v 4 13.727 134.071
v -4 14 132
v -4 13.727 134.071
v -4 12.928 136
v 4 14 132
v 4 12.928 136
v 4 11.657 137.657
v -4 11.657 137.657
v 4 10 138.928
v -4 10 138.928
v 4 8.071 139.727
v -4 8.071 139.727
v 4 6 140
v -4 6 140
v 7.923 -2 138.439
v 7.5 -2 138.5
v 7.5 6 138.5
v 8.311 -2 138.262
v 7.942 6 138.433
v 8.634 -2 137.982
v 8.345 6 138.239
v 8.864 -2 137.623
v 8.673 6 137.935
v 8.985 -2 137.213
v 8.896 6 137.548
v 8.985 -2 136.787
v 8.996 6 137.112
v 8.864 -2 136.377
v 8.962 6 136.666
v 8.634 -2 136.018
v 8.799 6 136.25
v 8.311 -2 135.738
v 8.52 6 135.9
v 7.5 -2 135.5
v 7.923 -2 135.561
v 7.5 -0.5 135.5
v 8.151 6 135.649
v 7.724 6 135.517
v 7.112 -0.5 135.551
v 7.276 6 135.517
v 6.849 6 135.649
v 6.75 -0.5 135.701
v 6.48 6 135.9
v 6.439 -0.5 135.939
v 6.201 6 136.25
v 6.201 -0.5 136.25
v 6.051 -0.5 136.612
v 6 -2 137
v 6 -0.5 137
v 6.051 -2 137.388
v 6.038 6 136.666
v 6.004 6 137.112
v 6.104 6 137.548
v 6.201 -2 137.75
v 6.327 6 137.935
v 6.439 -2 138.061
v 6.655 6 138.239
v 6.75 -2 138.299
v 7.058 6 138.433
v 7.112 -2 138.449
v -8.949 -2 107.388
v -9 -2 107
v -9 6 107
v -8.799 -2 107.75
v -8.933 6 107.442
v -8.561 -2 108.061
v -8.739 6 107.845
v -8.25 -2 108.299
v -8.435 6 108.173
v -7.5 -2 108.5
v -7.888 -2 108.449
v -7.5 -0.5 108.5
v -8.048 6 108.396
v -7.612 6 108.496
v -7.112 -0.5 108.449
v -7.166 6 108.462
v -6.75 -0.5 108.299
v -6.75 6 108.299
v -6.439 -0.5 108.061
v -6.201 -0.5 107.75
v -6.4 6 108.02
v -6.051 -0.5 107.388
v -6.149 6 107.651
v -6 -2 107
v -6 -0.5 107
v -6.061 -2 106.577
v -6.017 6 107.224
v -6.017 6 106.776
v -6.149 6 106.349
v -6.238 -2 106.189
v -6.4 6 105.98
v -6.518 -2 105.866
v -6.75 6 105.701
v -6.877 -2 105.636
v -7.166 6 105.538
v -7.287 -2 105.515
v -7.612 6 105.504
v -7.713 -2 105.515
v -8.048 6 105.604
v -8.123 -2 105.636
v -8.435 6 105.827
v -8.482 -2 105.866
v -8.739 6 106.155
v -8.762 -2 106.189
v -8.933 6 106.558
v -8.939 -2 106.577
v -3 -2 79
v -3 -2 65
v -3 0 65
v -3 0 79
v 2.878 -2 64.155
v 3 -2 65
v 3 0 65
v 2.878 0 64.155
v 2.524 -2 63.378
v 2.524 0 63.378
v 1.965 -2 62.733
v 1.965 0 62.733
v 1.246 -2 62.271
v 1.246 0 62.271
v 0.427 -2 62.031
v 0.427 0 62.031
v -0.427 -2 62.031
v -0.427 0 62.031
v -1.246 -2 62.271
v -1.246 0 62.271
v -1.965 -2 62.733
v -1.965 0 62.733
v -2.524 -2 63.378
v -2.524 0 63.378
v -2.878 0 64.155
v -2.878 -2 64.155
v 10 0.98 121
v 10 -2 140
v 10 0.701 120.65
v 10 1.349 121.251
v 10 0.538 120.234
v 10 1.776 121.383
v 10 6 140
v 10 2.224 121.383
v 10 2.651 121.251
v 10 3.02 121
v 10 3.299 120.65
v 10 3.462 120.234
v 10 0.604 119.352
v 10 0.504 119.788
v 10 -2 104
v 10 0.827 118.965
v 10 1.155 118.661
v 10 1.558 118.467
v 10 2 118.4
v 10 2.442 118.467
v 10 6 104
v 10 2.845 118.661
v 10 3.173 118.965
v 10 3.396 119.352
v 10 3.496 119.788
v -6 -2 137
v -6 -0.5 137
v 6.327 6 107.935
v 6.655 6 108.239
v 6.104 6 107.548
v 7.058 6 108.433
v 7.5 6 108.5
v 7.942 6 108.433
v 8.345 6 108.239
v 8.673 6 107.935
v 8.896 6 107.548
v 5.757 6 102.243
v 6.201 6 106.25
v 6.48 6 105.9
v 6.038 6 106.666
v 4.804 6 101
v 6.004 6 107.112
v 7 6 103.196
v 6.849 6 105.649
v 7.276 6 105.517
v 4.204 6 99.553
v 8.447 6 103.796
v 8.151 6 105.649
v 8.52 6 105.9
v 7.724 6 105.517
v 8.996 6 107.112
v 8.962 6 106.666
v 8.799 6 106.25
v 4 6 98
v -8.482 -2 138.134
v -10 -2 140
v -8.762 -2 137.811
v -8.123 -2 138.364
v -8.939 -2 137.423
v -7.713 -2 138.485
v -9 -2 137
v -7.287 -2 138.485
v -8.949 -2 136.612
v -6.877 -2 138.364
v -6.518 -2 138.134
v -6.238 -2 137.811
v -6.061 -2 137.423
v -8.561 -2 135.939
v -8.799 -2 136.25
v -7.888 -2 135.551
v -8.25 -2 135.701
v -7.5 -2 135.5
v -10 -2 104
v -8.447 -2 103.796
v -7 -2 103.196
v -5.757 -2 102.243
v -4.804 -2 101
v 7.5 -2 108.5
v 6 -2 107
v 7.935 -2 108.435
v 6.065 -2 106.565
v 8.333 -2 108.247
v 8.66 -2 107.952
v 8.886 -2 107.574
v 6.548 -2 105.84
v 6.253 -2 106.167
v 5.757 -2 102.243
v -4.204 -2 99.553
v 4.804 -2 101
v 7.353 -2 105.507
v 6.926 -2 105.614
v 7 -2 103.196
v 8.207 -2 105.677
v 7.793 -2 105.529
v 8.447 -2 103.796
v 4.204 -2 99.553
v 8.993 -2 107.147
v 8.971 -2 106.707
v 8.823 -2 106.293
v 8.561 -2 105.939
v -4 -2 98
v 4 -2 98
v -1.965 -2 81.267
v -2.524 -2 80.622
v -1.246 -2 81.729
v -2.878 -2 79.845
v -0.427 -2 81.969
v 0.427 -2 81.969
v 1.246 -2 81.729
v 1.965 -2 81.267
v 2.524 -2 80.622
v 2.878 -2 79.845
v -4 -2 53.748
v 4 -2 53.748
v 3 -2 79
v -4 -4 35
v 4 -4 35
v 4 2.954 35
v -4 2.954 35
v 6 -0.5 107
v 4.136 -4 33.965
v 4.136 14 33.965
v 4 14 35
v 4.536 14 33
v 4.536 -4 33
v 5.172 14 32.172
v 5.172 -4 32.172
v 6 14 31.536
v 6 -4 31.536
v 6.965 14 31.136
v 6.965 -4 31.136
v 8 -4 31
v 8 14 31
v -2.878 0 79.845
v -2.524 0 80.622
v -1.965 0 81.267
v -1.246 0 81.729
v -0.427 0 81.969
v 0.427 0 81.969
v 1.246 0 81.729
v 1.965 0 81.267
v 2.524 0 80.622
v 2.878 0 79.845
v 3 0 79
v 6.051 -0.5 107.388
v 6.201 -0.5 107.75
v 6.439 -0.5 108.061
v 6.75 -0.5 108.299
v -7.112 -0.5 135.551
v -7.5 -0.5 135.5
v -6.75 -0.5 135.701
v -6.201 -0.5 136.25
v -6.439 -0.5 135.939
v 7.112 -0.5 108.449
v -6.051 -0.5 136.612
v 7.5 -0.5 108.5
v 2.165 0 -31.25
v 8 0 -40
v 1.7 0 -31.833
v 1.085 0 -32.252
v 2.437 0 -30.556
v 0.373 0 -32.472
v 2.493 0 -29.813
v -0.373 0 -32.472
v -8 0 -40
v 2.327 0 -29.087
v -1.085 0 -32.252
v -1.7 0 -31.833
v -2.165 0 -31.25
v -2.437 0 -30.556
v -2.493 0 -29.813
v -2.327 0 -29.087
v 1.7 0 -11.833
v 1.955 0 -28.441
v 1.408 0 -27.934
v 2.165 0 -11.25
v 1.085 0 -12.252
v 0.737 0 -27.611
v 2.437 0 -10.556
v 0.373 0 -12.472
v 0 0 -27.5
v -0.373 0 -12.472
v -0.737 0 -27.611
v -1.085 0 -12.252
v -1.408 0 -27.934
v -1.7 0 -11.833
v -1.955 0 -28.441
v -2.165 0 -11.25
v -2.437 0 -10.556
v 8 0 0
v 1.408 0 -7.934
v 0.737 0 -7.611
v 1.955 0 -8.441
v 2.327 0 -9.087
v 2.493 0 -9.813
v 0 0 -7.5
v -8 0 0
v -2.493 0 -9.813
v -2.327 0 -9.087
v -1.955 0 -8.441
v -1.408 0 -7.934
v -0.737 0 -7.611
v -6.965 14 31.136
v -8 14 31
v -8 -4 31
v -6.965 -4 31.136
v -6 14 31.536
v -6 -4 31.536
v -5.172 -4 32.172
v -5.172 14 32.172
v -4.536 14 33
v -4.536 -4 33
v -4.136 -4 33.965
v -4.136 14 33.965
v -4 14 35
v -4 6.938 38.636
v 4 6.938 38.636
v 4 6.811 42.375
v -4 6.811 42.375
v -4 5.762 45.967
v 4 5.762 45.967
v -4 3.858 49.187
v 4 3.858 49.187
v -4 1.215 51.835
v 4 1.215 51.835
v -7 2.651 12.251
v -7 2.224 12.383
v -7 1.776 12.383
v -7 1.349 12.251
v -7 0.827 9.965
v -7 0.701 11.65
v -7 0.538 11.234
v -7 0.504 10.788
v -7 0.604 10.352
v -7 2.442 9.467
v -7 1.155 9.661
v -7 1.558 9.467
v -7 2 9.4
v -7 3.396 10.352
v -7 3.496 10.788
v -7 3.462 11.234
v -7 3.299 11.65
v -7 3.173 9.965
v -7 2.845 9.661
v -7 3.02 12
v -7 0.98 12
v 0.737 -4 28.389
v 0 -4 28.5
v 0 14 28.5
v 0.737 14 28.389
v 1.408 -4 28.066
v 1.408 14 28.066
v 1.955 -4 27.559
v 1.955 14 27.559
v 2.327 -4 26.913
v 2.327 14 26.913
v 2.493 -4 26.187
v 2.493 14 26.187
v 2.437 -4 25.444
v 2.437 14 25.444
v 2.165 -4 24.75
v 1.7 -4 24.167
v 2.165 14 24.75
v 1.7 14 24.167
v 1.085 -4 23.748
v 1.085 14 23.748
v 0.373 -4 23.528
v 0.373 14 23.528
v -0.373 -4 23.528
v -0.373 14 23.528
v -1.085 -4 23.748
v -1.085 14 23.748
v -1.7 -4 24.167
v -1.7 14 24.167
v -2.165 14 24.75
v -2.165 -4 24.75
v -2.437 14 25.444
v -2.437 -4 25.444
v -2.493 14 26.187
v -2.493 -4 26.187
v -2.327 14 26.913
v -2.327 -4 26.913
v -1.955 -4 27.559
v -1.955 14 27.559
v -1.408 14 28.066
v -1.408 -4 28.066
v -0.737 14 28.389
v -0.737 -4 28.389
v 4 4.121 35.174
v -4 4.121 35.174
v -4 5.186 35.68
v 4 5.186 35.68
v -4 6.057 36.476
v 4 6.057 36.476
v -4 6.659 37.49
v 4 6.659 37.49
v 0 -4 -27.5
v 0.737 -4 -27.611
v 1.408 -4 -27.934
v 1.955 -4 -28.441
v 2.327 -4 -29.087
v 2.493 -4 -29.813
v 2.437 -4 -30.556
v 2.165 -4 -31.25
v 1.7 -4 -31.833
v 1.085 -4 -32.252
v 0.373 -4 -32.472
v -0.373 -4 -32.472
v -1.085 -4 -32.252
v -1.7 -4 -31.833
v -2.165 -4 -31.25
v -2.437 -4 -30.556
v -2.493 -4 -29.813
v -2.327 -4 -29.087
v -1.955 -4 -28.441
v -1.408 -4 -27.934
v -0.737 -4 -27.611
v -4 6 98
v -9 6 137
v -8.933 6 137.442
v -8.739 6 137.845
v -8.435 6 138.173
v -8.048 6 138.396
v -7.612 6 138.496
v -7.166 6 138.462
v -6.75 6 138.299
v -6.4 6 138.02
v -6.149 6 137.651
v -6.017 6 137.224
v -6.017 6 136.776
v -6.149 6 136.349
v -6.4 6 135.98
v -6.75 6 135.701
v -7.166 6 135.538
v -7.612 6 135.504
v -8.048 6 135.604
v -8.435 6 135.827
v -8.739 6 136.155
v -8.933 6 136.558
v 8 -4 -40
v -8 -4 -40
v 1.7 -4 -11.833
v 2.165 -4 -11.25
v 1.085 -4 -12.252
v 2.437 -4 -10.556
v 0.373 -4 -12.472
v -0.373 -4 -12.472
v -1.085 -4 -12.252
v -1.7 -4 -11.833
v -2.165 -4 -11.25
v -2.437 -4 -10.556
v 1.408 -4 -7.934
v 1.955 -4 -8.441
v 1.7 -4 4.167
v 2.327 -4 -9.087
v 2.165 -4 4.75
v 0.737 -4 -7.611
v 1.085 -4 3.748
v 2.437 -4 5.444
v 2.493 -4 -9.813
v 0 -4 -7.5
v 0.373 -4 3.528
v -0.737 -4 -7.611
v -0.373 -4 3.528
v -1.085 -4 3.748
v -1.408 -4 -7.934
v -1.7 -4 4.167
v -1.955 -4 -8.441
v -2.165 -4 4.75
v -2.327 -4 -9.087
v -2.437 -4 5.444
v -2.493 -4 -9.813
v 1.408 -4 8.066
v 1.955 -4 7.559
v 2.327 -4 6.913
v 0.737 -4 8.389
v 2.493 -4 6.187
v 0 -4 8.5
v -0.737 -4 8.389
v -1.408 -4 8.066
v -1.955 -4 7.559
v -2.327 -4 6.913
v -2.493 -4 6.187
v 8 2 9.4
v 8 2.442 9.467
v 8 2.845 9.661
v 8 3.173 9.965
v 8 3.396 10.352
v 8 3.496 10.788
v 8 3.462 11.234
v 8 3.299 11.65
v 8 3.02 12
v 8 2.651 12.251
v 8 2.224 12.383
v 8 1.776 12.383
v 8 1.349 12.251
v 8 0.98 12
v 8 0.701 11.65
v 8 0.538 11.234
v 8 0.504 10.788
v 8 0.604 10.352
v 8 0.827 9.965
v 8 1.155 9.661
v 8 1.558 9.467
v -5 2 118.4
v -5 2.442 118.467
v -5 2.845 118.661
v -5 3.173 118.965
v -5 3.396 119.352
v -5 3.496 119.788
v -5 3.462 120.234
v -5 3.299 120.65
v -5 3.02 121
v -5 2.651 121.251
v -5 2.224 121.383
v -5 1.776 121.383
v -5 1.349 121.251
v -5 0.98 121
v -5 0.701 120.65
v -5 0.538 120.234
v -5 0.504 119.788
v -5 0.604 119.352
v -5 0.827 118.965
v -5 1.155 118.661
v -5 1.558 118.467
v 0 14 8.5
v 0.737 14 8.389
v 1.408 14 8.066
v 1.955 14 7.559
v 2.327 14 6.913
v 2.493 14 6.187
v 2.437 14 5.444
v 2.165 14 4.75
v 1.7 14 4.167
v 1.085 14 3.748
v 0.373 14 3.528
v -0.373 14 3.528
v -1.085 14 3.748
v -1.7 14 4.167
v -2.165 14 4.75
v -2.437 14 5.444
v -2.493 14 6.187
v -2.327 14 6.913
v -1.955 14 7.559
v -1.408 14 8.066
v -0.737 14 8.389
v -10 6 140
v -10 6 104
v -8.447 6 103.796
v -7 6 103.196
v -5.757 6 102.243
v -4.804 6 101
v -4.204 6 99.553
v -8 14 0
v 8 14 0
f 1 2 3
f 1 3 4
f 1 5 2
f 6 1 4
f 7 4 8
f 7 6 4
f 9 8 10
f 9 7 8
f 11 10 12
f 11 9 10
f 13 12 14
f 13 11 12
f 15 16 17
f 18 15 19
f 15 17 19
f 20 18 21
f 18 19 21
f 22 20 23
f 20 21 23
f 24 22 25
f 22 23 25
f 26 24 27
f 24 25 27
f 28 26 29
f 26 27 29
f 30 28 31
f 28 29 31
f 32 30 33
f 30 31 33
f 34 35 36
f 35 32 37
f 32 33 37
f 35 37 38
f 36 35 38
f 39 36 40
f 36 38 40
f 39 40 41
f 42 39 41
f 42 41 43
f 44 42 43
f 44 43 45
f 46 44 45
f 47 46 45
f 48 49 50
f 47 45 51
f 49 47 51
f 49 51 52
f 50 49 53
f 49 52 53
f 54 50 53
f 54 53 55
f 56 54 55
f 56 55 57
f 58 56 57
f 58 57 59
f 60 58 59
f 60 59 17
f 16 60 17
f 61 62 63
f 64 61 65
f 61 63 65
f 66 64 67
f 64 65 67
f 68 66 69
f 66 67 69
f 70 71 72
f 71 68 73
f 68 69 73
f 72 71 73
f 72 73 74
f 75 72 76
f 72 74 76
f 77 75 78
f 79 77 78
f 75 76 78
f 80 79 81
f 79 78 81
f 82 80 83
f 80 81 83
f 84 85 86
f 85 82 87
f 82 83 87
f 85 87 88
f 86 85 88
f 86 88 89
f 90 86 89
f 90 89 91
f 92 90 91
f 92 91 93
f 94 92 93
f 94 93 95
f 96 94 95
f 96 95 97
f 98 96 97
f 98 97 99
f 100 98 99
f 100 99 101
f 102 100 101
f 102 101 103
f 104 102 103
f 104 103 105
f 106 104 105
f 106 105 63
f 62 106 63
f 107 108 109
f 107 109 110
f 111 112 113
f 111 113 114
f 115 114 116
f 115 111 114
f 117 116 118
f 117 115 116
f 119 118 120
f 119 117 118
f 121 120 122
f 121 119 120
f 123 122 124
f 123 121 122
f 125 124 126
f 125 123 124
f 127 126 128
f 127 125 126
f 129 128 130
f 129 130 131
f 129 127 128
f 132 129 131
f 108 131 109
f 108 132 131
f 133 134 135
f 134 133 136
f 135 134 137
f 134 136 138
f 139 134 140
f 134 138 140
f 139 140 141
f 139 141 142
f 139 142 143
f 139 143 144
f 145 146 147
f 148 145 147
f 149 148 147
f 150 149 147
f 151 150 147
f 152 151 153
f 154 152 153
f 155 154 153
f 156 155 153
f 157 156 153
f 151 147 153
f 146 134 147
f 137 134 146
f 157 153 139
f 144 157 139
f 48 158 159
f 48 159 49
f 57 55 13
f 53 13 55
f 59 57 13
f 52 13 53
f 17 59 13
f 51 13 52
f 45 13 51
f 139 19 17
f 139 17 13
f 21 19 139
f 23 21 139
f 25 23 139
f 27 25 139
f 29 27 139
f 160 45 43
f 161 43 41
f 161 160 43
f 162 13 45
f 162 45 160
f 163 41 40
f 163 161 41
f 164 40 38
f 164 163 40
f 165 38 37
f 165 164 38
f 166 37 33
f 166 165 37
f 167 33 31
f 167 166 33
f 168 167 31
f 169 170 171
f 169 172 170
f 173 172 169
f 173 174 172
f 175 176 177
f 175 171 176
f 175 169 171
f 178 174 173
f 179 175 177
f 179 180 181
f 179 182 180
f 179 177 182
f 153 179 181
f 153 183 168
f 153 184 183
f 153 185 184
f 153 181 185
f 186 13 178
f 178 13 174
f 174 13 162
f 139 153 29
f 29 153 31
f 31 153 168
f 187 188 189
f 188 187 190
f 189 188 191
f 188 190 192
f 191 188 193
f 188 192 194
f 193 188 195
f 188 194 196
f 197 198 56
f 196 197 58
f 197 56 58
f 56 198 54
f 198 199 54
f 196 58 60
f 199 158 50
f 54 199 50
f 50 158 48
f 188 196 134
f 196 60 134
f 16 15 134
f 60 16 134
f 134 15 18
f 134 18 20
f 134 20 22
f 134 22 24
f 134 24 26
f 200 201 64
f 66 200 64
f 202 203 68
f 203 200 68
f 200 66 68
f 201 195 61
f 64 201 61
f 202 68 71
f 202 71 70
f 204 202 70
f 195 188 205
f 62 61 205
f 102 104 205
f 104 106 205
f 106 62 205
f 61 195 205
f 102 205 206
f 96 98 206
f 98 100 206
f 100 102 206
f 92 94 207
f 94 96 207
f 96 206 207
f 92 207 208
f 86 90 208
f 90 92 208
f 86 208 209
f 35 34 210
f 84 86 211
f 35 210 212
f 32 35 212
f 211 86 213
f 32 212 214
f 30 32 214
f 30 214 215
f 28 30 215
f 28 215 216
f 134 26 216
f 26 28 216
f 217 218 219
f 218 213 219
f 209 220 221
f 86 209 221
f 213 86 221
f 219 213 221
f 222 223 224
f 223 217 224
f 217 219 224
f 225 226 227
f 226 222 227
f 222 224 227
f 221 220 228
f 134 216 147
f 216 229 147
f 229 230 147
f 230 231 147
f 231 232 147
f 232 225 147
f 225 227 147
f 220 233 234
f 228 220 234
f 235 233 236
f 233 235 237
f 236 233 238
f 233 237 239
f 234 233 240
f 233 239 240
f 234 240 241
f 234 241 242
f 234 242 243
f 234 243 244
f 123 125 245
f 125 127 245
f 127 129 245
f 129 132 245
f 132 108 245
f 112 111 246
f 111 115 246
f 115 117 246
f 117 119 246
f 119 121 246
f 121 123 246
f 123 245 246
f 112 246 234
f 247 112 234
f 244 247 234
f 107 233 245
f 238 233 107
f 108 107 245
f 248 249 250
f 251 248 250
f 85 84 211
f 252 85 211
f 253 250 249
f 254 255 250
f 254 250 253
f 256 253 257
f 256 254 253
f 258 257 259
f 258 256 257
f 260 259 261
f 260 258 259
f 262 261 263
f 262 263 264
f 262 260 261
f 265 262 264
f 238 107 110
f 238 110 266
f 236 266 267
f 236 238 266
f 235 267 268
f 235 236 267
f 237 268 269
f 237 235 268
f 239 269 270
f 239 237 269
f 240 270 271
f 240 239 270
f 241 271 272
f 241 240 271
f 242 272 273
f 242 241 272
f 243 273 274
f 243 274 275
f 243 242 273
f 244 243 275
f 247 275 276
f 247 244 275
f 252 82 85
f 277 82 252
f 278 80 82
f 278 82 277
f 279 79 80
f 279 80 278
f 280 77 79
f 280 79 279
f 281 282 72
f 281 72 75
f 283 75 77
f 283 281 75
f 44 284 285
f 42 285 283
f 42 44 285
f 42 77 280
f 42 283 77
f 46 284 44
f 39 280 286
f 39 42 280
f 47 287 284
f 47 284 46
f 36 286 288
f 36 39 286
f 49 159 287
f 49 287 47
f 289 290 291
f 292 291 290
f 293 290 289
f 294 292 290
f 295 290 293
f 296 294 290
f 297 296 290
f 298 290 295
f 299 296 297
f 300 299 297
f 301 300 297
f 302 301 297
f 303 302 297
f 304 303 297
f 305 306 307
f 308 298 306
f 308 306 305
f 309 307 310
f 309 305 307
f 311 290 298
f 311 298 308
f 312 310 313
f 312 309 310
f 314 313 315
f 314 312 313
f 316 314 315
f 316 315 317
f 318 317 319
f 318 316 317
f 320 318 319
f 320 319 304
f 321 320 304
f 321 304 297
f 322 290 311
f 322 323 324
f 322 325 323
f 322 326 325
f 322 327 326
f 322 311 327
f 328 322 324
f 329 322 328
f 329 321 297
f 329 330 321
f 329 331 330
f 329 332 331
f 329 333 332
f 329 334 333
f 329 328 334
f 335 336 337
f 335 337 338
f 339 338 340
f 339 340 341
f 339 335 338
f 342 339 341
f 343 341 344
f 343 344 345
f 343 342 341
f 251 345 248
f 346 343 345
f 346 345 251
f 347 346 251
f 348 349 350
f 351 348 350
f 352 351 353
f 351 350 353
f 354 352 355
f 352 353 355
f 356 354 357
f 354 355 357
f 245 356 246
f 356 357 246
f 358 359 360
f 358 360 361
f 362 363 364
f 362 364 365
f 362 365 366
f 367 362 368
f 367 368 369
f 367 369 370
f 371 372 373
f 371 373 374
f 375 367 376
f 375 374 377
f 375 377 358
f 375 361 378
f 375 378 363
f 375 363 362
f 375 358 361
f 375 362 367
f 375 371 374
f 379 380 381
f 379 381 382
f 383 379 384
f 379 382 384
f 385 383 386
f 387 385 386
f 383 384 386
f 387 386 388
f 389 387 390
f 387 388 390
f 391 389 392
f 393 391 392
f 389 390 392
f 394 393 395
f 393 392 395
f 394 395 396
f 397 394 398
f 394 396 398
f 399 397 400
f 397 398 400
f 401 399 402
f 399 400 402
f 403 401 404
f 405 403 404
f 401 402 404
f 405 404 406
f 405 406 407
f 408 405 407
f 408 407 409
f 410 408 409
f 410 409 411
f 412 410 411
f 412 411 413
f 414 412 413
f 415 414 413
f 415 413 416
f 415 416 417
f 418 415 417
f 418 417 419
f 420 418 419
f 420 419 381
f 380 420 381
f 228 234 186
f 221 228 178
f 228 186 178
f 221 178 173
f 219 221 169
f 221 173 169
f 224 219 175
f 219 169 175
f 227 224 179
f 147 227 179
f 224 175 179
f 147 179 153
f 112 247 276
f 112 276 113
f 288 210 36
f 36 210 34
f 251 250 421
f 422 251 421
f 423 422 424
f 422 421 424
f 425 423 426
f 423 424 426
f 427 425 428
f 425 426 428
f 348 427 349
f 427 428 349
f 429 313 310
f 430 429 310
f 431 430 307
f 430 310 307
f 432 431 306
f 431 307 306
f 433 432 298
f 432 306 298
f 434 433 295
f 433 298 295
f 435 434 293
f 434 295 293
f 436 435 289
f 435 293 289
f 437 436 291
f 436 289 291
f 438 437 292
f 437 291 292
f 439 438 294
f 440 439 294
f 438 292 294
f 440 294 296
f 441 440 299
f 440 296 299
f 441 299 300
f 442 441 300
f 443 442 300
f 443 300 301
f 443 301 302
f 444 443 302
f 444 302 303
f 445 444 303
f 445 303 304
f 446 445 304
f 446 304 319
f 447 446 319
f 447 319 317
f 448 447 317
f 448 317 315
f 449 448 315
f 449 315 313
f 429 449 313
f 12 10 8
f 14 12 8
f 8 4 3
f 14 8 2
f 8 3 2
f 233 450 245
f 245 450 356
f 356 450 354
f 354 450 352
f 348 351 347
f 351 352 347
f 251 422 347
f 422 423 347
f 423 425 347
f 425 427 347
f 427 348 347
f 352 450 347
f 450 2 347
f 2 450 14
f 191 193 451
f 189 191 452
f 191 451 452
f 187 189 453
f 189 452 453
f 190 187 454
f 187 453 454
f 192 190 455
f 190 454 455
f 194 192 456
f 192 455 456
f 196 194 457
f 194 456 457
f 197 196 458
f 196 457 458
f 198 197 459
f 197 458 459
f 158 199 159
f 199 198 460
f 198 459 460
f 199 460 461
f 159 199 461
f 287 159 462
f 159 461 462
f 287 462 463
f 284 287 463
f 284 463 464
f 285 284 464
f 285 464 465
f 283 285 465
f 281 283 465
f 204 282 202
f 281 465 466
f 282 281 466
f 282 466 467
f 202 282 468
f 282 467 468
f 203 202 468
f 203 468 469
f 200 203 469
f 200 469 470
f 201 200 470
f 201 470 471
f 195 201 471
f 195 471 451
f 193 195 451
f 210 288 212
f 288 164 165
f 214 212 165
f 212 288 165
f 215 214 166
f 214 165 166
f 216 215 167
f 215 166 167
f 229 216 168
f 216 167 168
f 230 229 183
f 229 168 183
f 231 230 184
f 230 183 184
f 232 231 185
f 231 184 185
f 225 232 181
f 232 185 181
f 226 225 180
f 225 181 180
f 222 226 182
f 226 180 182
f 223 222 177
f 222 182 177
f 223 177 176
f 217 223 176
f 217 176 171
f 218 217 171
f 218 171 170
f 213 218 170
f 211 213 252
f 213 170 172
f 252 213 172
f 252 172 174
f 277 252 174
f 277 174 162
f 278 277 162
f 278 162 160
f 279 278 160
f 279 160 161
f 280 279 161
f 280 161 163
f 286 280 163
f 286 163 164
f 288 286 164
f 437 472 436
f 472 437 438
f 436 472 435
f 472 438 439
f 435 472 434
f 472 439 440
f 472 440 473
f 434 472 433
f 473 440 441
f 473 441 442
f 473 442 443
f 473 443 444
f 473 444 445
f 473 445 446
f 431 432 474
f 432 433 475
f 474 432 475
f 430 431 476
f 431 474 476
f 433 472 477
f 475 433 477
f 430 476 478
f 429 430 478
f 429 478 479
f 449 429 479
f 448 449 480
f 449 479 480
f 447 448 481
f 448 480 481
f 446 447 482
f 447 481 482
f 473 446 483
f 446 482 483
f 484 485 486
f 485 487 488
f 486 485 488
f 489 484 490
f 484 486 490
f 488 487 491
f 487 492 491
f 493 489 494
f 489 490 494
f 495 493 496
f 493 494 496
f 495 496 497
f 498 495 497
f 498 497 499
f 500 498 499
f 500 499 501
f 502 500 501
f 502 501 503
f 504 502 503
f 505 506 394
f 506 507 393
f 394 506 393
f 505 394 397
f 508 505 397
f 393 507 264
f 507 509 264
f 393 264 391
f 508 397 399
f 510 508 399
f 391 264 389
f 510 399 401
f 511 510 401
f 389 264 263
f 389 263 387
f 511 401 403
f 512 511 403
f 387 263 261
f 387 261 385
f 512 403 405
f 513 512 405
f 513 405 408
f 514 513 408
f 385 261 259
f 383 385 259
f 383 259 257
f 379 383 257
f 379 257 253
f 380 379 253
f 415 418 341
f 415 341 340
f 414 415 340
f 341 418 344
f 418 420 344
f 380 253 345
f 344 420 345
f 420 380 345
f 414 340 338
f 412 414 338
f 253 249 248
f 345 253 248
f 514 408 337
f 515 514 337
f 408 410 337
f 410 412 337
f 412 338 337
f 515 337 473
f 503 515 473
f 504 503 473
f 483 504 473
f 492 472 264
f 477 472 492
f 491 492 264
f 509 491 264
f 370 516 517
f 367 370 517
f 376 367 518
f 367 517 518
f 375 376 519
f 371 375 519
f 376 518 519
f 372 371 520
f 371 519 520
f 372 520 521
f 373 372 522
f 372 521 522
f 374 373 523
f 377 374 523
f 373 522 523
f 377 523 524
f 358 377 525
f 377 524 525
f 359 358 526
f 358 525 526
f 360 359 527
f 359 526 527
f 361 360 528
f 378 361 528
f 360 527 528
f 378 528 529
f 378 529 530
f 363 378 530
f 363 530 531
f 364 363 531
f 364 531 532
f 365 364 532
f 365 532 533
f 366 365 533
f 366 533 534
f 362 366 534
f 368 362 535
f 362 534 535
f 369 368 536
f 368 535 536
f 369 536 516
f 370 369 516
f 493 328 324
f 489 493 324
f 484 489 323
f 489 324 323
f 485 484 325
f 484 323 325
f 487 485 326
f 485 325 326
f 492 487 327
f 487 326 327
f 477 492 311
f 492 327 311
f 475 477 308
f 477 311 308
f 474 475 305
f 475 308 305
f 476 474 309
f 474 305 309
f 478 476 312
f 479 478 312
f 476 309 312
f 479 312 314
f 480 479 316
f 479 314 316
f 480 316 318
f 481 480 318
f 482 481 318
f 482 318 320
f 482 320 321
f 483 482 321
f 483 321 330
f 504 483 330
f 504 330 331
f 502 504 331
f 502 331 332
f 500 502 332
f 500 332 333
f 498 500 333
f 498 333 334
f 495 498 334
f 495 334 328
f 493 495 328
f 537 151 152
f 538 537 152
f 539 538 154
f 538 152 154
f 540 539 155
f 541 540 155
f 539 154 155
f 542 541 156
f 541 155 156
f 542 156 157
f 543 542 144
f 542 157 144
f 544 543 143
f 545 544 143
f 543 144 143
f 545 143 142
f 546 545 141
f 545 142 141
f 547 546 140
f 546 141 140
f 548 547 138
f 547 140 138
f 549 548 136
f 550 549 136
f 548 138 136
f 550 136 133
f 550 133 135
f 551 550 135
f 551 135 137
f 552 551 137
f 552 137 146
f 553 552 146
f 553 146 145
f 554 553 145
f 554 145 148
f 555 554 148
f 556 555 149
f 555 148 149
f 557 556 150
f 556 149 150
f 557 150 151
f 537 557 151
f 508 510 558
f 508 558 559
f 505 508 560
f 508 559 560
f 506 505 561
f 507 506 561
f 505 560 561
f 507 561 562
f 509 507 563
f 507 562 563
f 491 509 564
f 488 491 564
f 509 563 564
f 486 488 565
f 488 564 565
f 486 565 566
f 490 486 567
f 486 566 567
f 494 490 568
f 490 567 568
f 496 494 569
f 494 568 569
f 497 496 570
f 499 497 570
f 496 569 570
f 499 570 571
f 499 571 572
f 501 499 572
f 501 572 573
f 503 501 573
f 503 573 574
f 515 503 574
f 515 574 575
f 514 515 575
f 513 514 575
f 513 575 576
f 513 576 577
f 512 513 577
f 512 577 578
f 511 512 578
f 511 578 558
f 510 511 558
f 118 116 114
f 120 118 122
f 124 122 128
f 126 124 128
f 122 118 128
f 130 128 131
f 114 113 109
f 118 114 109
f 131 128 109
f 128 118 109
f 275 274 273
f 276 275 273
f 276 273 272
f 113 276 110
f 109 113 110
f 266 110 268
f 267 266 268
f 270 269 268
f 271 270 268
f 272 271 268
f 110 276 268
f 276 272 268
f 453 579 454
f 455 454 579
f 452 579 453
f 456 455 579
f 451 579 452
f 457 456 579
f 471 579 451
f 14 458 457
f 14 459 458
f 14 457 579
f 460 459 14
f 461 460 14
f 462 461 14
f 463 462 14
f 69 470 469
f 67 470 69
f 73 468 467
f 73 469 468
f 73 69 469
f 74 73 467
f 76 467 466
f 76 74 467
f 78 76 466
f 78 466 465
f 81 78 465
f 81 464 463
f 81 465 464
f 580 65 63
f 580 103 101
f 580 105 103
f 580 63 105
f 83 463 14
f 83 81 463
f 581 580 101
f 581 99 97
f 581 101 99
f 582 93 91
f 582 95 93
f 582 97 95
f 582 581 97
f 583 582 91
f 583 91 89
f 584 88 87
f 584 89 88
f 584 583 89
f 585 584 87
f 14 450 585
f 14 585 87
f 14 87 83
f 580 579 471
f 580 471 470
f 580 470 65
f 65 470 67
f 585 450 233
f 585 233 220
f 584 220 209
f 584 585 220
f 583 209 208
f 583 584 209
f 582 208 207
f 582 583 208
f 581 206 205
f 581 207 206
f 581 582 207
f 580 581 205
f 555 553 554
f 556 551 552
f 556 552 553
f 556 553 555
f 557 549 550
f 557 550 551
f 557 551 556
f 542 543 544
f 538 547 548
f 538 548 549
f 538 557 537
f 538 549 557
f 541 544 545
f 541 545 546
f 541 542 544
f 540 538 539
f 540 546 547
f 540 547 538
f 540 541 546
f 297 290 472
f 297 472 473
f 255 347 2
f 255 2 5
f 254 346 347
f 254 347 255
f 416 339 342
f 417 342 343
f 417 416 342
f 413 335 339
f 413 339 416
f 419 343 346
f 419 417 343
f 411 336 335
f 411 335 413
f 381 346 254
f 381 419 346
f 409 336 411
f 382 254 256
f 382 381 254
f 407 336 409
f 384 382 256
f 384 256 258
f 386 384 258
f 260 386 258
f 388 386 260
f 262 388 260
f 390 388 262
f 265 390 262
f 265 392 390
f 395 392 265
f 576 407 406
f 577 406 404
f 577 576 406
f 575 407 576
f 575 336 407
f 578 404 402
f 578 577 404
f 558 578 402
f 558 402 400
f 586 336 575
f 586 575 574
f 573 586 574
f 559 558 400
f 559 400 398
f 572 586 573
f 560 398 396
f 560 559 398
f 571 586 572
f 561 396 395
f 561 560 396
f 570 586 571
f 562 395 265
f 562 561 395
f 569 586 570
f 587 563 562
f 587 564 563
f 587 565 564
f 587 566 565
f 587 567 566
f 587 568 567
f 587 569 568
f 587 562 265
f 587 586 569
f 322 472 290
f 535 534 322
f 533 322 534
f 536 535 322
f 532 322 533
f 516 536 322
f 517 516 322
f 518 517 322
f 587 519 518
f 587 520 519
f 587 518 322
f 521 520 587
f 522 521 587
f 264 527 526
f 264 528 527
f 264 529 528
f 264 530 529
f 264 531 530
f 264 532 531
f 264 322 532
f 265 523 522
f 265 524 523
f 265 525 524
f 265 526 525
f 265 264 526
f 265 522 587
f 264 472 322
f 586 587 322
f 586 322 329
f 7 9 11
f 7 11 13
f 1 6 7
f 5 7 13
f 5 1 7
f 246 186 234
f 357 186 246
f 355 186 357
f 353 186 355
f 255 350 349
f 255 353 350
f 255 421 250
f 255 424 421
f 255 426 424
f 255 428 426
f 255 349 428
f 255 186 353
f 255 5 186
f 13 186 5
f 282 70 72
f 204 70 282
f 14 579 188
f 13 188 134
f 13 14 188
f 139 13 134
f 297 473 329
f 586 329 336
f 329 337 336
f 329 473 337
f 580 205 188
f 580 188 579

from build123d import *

# Parameters (mm, degrees)
SKETCH1_W           = 20
SKETCH1_H           = 8
BOSS_EXTRUDE1_DEPTH = 140
CUT_EXTRUDE1_DEPTH  = 141.584494166
BOSS_EXTRUDE2_DEPTH = 4
CUT_EXTRUDE2_DEPTH  = 142.393069137
BOSS_EXTRUDE3_DEPTH = 18
SKETCH7_W           = 16
SKETCH7_H           = 4
BOSS_EXTRUDE4_DEPTH = 40
SKETCH8_R           = 1.5
CUT_EXTRUDE3_DEPTH  = 141.712472795
SKETCH9_W           = 15
SKETCH9_H           = 30
CUT_EXTRUDE4_DEPTH  = 1.5
CUT_EXTRUDE5_DEPTH  = 2
SKETCH11_R          = 2.5
CUT_EXTRUDE6_DEPTH  = 142.50618361
SKETCH12_R          = 2.5
CUT_EXTRUDE7_DEPTH  = 142.05318146
SKETCH13_R          = 1.5
CUT_EXTRUDE8_DEPTH  = 15
SKETCH14_R          = 1.5
CUT_EXTRUDE9_DEPTH  = 15


with BuildPart() as part:
    # Sketch1 → Boss-Extrude1 (new body)
    with BuildSketch(Plane.XY):
        with Locations((0, 2)):
            Rectangle(SKETCH1_W, SKETCH1_H)
    extrude(amount=BOSS_EXTRUDE1_DEPTH)

    # Sketch2 → Cut-Extrude1 (cut, through all)
    with BuildSketch(Plane(origin=(0, 6, 0), x_dir=(1, 0, 0), z_dir=(0, 1, 0))):
        with BuildLine():
            Line((-10, 0), (-4, 0))
            Line((-4, 0), (-4, -98))
            ThreePointArc((-4, -98), (-5.757359313, -102.242640687), (-10, -104))
            Line((-10, -104), (-10, 0))
        make_face()
        with BuildLine():
            Line((10, -104), (10, 0))
            Line((10, 0), (4, 0))
            Line((4, 0), (4, -98))
            ThreePointArc((4, -98), (5.757359313, -102.242640687), (10, -104))
        make_face()
    extrude(amount=-CUT_EXTRUDE1_DEPTH, mode=Mode.SUBTRACT)

    # Sketch3 → Boss-Extrude2 (add, symmetric)
    with BuildSketch(Plane(origin=(0, 0, 0), x_dir=(0, 0, -1), z_dir=(1, 0, 0))):
        with BuildLine():
            Line((-140, 6), (0, 6))
            Line((0, 6), (0, 14))
            Line((0, 14), (-132, 14))
            ThreePointArc((-132, 14), (-137.656854249, 11.656854249), (-140, 6))
        make_face()
    extrude(amount=BOSS_EXTRUDE2_DEPTH, both=True)

    # Sketch4 → Cut-Extrude2 (cut, through all)
    with BuildSketch(Plane(origin=(4, 0, 0), x_dir=(0, 0, -1), z_dir=(1, 0, 0))):
        with BuildLine():
            Line((-35, -2), (-35, 2.95445115))
            ThreePointArc((-35, 2.95445115), (-36.045804216, 5.6512506), (-38.636363636, 6.937887932))
            ThreePointArc((-38.636363636, 6.937887932), (-47.636287443, 4.910736388), (-53.747727085, -2))
            Line((-53.747727085, -2), (-35, -2))
        make_face()
    extrude(amount=-CUT_EXTRUDE2_DEPTH, mode=Mode.SUBTRACT)

    # Sketch6 → Boss-Extrude3 (add)
    with BuildSketch(Plane(origin=(0, 14, 0), x_dir=(1, 0, 0), z_dir=(0, 1, 0))):
        with BuildLine():
            Line((-4, 0), (-8, 0))
            Line((-8, 0), (-8, -31))
            ThreePointArc((-8, -31), (-5.171572875, -32.171572875), (-4, -35))
            Line((-4, -35), (4, -35))
            ThreePointArc((4, -35), (5.171572875, -32.171572875), (8, -31))
            Line((8, -31), (8, 0))
            Line((8, 0), (4, 0))
            Line((4, 0), (-4, 0))
        make_face()
    extrude(amount=-BOSS_EXTRUDE3_DEPTH)

    # Sketch7 → Boss-Extrude4 (add)
    with BuildSketch(Plane(origin=(0, 0, 0), x_dir=(-1, 0, 0), z_dir=(0, 0, -1))):
        with Locations((0, -2)):
            Rectangle(SKETCH7_W, SKETCH7_H)
    extrude(amount=BOSS_EXTRUDE4_DEPTH)

    # Sketch8 → Cut-Extrude3 (cut, through all)
    with BuildSketch(Plane(origin=(0, 6, 0), x_dir=(1, 0, 0), z_dir=(0, 1, 0))):
        with Locations(Location((7.5, -137, 0), (0, 0, 270))):
            Circle(SKETCH8_R)
        with Locations(Location((7.5, -107, 0), (0, 0, 270))):
            Circle(SKETCH8_R)
        with Locations(Location((-7.5, -107, 0), (0, 0, 180))):
            Circle(SKETCH8_R)
        with Locations(Location((-7.5, -137, 0), (0, 0, 180))):
            Circle(SKETCH8_R)
    extrude(amount=-CUT_EXTRUDE3_DEPTH, mode=Mode.SUBTRACT)

    # Sketch9 → Cut-Extrude4 (cut)
    with BuildSketch(Plane.XZ.offset(2)):
        with Locations((0, 122)):
            Rectangle(SKETCH9_W, SKETCH9_H)
    extrude(amount=-CUT_EXTRUDE4_DEPTH, mode=Mode.SUBTRACT)

    # Sketch10 → Cut-Extrude5 (cut)
    with BuildSketch(Plane.XZ.offset(2)):
        with BuildLine():
            Line((3, 79), (3, 65))
            ThreePointArc((3, 65), (0, 62), (-3, 65))
            Line((-3, 65), (-3, 79))
            ThreePointArc((-3, 79), (0, 82), (3, 79))
        make_face()
    extrude(amount=-CUT_EXTRUDE5_DEPTH, mode=Mode.SUBTRACT)

    # Sketch11 → Cut-Extrude6 (cut, through all)
    with BuildSketch(Plane(origin=(0, 14, 0), x_dir=(1, 0, 0), z_dir=(0, 1, 0))):
        with Locations(Location((0, -26, 0), (0, 0, 270))):
            Circle(SKETCH11_R)
        with Locations(Location((0, -6, 0), (0, 0, 270))):
            Circle(SKETCH11_R)
    extrude(amount=-CUT_EXTRUDE6_DEPTH, mode=Mode.SUBTRACT)

    # Sketch12 → Cut-Extrude7 (cut, through all)
    with BuildSketch(Plane(origin=(0, 0, 0), x_dir=(1, 0, 0), z_dir=(0, 1, 0))):
        with Locations(Location((0, 10, 0), (0, 0, 270))):
            Circle(SKETCH12_R)
        with Locations(Location((0, 30, 0), (0, 0, 270))):
            Circle(SKETCH12_R)
    extrude(amount=-CUT_EXTRUDE7_DEPTH, mode=Mode.SUBTRACT)

    # Sketch13 → Cut-Extrude8 (cut)
    with BuildSketch(Plane(origin=(10, 0, 0), x_dir=(0, 0, -1), z_dir=(1, 0, 0))):
        with Locations((-119.9, 2)):
            Circle(SKETCH13_R)
    extrude(amount=-CUT_EXTRUDE8_DEPTH, mode=Mode.SUBTRACT)

    # Sketch14 → Cut-Extrude9 (cut)
    with BuildSketch(Plane(origin=(8, 0, 0), x_dir=(0, 0, -1), z_dir=(1, 0, 0))):
        with Locations((-10.9, 2)):
            Circle(SKETCH14_R)
    extrude(amount=-CUT_EXTRUDE9_DEPTH, mode=Mode.SUBTRACT)


solid = part.part
